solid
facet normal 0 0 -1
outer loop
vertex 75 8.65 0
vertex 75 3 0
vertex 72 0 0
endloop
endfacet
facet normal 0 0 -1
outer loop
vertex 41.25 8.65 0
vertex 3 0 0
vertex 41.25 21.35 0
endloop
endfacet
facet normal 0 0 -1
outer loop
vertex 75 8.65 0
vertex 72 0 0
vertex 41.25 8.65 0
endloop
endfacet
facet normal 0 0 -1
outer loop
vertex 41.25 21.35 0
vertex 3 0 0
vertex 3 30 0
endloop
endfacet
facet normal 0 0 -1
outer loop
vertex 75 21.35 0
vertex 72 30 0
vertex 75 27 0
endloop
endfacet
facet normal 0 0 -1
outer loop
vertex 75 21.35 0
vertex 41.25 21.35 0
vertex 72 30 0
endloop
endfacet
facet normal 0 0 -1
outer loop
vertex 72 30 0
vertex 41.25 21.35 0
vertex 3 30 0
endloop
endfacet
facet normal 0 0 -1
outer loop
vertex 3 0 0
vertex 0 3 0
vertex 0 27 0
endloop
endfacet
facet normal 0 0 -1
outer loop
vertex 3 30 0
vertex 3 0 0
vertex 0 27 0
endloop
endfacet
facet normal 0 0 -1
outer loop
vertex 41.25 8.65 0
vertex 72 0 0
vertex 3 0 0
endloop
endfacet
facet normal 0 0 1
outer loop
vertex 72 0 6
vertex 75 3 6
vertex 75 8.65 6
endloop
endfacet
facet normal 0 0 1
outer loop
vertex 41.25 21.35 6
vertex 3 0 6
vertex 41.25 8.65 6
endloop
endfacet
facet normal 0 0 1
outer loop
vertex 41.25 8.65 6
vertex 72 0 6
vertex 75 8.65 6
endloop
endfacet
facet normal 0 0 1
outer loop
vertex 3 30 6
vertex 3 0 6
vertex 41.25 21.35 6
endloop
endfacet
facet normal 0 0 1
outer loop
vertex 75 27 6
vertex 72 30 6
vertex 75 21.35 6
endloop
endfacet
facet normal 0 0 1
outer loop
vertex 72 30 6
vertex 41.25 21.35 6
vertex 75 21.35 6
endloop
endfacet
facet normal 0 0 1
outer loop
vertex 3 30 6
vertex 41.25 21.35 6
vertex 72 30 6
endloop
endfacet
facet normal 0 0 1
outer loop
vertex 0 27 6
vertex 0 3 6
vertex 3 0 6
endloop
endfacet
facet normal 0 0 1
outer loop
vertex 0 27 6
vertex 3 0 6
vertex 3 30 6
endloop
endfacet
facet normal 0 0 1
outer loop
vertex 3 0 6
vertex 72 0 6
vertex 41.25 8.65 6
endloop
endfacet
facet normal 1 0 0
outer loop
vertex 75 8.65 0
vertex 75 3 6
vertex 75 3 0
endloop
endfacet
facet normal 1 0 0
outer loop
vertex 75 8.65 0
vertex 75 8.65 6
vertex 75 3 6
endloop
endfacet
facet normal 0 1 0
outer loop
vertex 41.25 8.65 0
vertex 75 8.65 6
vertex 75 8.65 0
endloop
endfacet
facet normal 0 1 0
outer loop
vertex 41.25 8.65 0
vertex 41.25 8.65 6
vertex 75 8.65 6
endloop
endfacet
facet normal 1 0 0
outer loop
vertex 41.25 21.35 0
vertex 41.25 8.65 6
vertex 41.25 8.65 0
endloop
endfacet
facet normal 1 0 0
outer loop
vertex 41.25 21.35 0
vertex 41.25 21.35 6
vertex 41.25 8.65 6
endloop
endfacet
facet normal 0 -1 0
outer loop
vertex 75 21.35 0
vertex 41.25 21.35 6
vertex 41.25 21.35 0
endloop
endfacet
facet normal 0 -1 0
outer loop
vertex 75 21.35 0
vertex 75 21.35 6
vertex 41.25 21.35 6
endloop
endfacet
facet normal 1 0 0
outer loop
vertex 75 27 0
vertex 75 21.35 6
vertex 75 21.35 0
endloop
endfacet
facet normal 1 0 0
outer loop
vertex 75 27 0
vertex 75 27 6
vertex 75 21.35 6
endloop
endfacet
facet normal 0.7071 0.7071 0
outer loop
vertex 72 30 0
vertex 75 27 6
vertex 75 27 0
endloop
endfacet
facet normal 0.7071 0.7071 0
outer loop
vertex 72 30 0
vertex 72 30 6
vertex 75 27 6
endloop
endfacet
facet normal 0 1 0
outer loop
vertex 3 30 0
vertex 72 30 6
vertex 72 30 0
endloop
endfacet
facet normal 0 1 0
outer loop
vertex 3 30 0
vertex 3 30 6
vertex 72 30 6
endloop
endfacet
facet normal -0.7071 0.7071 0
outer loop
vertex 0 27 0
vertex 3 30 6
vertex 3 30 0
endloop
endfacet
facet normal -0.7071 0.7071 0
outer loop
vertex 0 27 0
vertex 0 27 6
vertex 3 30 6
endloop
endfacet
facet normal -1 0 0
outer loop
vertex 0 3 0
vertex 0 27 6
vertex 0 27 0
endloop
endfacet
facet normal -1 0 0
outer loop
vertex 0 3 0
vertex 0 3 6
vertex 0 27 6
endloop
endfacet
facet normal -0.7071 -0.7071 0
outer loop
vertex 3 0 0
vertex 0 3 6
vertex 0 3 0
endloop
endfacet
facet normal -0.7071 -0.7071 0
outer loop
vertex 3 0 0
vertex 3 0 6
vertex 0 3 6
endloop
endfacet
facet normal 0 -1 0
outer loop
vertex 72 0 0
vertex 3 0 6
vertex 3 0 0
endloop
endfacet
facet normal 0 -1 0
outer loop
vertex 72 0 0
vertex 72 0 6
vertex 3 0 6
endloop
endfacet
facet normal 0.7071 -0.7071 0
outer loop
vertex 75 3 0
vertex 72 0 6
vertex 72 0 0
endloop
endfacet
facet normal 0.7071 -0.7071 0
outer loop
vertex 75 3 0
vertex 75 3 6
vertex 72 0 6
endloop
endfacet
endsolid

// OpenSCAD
$fn = 32;

// ----------------------------------------------------------------------
// C washer: 75 x 30 mm plate with an open slot
// ----------------------------------------------------------------------

// --- parameters (mm) ---
profile_height = 6;       // extrusion height
profile_points = 12;      // points of the closed outline

profile = [[3, 0], [72, 0], [75, 3], [75, 8.65], [41.25, 8.65], [41.25, 21.35], [75, 21.35], [75, 27], [72, 30], [3, 30], [0, 27], [0, 3]];  // single closed polygon, 12 points, counter clockwise

// --- the one profile operation ---
linear_extrude(height = profile_height) polygon(points = profile);
